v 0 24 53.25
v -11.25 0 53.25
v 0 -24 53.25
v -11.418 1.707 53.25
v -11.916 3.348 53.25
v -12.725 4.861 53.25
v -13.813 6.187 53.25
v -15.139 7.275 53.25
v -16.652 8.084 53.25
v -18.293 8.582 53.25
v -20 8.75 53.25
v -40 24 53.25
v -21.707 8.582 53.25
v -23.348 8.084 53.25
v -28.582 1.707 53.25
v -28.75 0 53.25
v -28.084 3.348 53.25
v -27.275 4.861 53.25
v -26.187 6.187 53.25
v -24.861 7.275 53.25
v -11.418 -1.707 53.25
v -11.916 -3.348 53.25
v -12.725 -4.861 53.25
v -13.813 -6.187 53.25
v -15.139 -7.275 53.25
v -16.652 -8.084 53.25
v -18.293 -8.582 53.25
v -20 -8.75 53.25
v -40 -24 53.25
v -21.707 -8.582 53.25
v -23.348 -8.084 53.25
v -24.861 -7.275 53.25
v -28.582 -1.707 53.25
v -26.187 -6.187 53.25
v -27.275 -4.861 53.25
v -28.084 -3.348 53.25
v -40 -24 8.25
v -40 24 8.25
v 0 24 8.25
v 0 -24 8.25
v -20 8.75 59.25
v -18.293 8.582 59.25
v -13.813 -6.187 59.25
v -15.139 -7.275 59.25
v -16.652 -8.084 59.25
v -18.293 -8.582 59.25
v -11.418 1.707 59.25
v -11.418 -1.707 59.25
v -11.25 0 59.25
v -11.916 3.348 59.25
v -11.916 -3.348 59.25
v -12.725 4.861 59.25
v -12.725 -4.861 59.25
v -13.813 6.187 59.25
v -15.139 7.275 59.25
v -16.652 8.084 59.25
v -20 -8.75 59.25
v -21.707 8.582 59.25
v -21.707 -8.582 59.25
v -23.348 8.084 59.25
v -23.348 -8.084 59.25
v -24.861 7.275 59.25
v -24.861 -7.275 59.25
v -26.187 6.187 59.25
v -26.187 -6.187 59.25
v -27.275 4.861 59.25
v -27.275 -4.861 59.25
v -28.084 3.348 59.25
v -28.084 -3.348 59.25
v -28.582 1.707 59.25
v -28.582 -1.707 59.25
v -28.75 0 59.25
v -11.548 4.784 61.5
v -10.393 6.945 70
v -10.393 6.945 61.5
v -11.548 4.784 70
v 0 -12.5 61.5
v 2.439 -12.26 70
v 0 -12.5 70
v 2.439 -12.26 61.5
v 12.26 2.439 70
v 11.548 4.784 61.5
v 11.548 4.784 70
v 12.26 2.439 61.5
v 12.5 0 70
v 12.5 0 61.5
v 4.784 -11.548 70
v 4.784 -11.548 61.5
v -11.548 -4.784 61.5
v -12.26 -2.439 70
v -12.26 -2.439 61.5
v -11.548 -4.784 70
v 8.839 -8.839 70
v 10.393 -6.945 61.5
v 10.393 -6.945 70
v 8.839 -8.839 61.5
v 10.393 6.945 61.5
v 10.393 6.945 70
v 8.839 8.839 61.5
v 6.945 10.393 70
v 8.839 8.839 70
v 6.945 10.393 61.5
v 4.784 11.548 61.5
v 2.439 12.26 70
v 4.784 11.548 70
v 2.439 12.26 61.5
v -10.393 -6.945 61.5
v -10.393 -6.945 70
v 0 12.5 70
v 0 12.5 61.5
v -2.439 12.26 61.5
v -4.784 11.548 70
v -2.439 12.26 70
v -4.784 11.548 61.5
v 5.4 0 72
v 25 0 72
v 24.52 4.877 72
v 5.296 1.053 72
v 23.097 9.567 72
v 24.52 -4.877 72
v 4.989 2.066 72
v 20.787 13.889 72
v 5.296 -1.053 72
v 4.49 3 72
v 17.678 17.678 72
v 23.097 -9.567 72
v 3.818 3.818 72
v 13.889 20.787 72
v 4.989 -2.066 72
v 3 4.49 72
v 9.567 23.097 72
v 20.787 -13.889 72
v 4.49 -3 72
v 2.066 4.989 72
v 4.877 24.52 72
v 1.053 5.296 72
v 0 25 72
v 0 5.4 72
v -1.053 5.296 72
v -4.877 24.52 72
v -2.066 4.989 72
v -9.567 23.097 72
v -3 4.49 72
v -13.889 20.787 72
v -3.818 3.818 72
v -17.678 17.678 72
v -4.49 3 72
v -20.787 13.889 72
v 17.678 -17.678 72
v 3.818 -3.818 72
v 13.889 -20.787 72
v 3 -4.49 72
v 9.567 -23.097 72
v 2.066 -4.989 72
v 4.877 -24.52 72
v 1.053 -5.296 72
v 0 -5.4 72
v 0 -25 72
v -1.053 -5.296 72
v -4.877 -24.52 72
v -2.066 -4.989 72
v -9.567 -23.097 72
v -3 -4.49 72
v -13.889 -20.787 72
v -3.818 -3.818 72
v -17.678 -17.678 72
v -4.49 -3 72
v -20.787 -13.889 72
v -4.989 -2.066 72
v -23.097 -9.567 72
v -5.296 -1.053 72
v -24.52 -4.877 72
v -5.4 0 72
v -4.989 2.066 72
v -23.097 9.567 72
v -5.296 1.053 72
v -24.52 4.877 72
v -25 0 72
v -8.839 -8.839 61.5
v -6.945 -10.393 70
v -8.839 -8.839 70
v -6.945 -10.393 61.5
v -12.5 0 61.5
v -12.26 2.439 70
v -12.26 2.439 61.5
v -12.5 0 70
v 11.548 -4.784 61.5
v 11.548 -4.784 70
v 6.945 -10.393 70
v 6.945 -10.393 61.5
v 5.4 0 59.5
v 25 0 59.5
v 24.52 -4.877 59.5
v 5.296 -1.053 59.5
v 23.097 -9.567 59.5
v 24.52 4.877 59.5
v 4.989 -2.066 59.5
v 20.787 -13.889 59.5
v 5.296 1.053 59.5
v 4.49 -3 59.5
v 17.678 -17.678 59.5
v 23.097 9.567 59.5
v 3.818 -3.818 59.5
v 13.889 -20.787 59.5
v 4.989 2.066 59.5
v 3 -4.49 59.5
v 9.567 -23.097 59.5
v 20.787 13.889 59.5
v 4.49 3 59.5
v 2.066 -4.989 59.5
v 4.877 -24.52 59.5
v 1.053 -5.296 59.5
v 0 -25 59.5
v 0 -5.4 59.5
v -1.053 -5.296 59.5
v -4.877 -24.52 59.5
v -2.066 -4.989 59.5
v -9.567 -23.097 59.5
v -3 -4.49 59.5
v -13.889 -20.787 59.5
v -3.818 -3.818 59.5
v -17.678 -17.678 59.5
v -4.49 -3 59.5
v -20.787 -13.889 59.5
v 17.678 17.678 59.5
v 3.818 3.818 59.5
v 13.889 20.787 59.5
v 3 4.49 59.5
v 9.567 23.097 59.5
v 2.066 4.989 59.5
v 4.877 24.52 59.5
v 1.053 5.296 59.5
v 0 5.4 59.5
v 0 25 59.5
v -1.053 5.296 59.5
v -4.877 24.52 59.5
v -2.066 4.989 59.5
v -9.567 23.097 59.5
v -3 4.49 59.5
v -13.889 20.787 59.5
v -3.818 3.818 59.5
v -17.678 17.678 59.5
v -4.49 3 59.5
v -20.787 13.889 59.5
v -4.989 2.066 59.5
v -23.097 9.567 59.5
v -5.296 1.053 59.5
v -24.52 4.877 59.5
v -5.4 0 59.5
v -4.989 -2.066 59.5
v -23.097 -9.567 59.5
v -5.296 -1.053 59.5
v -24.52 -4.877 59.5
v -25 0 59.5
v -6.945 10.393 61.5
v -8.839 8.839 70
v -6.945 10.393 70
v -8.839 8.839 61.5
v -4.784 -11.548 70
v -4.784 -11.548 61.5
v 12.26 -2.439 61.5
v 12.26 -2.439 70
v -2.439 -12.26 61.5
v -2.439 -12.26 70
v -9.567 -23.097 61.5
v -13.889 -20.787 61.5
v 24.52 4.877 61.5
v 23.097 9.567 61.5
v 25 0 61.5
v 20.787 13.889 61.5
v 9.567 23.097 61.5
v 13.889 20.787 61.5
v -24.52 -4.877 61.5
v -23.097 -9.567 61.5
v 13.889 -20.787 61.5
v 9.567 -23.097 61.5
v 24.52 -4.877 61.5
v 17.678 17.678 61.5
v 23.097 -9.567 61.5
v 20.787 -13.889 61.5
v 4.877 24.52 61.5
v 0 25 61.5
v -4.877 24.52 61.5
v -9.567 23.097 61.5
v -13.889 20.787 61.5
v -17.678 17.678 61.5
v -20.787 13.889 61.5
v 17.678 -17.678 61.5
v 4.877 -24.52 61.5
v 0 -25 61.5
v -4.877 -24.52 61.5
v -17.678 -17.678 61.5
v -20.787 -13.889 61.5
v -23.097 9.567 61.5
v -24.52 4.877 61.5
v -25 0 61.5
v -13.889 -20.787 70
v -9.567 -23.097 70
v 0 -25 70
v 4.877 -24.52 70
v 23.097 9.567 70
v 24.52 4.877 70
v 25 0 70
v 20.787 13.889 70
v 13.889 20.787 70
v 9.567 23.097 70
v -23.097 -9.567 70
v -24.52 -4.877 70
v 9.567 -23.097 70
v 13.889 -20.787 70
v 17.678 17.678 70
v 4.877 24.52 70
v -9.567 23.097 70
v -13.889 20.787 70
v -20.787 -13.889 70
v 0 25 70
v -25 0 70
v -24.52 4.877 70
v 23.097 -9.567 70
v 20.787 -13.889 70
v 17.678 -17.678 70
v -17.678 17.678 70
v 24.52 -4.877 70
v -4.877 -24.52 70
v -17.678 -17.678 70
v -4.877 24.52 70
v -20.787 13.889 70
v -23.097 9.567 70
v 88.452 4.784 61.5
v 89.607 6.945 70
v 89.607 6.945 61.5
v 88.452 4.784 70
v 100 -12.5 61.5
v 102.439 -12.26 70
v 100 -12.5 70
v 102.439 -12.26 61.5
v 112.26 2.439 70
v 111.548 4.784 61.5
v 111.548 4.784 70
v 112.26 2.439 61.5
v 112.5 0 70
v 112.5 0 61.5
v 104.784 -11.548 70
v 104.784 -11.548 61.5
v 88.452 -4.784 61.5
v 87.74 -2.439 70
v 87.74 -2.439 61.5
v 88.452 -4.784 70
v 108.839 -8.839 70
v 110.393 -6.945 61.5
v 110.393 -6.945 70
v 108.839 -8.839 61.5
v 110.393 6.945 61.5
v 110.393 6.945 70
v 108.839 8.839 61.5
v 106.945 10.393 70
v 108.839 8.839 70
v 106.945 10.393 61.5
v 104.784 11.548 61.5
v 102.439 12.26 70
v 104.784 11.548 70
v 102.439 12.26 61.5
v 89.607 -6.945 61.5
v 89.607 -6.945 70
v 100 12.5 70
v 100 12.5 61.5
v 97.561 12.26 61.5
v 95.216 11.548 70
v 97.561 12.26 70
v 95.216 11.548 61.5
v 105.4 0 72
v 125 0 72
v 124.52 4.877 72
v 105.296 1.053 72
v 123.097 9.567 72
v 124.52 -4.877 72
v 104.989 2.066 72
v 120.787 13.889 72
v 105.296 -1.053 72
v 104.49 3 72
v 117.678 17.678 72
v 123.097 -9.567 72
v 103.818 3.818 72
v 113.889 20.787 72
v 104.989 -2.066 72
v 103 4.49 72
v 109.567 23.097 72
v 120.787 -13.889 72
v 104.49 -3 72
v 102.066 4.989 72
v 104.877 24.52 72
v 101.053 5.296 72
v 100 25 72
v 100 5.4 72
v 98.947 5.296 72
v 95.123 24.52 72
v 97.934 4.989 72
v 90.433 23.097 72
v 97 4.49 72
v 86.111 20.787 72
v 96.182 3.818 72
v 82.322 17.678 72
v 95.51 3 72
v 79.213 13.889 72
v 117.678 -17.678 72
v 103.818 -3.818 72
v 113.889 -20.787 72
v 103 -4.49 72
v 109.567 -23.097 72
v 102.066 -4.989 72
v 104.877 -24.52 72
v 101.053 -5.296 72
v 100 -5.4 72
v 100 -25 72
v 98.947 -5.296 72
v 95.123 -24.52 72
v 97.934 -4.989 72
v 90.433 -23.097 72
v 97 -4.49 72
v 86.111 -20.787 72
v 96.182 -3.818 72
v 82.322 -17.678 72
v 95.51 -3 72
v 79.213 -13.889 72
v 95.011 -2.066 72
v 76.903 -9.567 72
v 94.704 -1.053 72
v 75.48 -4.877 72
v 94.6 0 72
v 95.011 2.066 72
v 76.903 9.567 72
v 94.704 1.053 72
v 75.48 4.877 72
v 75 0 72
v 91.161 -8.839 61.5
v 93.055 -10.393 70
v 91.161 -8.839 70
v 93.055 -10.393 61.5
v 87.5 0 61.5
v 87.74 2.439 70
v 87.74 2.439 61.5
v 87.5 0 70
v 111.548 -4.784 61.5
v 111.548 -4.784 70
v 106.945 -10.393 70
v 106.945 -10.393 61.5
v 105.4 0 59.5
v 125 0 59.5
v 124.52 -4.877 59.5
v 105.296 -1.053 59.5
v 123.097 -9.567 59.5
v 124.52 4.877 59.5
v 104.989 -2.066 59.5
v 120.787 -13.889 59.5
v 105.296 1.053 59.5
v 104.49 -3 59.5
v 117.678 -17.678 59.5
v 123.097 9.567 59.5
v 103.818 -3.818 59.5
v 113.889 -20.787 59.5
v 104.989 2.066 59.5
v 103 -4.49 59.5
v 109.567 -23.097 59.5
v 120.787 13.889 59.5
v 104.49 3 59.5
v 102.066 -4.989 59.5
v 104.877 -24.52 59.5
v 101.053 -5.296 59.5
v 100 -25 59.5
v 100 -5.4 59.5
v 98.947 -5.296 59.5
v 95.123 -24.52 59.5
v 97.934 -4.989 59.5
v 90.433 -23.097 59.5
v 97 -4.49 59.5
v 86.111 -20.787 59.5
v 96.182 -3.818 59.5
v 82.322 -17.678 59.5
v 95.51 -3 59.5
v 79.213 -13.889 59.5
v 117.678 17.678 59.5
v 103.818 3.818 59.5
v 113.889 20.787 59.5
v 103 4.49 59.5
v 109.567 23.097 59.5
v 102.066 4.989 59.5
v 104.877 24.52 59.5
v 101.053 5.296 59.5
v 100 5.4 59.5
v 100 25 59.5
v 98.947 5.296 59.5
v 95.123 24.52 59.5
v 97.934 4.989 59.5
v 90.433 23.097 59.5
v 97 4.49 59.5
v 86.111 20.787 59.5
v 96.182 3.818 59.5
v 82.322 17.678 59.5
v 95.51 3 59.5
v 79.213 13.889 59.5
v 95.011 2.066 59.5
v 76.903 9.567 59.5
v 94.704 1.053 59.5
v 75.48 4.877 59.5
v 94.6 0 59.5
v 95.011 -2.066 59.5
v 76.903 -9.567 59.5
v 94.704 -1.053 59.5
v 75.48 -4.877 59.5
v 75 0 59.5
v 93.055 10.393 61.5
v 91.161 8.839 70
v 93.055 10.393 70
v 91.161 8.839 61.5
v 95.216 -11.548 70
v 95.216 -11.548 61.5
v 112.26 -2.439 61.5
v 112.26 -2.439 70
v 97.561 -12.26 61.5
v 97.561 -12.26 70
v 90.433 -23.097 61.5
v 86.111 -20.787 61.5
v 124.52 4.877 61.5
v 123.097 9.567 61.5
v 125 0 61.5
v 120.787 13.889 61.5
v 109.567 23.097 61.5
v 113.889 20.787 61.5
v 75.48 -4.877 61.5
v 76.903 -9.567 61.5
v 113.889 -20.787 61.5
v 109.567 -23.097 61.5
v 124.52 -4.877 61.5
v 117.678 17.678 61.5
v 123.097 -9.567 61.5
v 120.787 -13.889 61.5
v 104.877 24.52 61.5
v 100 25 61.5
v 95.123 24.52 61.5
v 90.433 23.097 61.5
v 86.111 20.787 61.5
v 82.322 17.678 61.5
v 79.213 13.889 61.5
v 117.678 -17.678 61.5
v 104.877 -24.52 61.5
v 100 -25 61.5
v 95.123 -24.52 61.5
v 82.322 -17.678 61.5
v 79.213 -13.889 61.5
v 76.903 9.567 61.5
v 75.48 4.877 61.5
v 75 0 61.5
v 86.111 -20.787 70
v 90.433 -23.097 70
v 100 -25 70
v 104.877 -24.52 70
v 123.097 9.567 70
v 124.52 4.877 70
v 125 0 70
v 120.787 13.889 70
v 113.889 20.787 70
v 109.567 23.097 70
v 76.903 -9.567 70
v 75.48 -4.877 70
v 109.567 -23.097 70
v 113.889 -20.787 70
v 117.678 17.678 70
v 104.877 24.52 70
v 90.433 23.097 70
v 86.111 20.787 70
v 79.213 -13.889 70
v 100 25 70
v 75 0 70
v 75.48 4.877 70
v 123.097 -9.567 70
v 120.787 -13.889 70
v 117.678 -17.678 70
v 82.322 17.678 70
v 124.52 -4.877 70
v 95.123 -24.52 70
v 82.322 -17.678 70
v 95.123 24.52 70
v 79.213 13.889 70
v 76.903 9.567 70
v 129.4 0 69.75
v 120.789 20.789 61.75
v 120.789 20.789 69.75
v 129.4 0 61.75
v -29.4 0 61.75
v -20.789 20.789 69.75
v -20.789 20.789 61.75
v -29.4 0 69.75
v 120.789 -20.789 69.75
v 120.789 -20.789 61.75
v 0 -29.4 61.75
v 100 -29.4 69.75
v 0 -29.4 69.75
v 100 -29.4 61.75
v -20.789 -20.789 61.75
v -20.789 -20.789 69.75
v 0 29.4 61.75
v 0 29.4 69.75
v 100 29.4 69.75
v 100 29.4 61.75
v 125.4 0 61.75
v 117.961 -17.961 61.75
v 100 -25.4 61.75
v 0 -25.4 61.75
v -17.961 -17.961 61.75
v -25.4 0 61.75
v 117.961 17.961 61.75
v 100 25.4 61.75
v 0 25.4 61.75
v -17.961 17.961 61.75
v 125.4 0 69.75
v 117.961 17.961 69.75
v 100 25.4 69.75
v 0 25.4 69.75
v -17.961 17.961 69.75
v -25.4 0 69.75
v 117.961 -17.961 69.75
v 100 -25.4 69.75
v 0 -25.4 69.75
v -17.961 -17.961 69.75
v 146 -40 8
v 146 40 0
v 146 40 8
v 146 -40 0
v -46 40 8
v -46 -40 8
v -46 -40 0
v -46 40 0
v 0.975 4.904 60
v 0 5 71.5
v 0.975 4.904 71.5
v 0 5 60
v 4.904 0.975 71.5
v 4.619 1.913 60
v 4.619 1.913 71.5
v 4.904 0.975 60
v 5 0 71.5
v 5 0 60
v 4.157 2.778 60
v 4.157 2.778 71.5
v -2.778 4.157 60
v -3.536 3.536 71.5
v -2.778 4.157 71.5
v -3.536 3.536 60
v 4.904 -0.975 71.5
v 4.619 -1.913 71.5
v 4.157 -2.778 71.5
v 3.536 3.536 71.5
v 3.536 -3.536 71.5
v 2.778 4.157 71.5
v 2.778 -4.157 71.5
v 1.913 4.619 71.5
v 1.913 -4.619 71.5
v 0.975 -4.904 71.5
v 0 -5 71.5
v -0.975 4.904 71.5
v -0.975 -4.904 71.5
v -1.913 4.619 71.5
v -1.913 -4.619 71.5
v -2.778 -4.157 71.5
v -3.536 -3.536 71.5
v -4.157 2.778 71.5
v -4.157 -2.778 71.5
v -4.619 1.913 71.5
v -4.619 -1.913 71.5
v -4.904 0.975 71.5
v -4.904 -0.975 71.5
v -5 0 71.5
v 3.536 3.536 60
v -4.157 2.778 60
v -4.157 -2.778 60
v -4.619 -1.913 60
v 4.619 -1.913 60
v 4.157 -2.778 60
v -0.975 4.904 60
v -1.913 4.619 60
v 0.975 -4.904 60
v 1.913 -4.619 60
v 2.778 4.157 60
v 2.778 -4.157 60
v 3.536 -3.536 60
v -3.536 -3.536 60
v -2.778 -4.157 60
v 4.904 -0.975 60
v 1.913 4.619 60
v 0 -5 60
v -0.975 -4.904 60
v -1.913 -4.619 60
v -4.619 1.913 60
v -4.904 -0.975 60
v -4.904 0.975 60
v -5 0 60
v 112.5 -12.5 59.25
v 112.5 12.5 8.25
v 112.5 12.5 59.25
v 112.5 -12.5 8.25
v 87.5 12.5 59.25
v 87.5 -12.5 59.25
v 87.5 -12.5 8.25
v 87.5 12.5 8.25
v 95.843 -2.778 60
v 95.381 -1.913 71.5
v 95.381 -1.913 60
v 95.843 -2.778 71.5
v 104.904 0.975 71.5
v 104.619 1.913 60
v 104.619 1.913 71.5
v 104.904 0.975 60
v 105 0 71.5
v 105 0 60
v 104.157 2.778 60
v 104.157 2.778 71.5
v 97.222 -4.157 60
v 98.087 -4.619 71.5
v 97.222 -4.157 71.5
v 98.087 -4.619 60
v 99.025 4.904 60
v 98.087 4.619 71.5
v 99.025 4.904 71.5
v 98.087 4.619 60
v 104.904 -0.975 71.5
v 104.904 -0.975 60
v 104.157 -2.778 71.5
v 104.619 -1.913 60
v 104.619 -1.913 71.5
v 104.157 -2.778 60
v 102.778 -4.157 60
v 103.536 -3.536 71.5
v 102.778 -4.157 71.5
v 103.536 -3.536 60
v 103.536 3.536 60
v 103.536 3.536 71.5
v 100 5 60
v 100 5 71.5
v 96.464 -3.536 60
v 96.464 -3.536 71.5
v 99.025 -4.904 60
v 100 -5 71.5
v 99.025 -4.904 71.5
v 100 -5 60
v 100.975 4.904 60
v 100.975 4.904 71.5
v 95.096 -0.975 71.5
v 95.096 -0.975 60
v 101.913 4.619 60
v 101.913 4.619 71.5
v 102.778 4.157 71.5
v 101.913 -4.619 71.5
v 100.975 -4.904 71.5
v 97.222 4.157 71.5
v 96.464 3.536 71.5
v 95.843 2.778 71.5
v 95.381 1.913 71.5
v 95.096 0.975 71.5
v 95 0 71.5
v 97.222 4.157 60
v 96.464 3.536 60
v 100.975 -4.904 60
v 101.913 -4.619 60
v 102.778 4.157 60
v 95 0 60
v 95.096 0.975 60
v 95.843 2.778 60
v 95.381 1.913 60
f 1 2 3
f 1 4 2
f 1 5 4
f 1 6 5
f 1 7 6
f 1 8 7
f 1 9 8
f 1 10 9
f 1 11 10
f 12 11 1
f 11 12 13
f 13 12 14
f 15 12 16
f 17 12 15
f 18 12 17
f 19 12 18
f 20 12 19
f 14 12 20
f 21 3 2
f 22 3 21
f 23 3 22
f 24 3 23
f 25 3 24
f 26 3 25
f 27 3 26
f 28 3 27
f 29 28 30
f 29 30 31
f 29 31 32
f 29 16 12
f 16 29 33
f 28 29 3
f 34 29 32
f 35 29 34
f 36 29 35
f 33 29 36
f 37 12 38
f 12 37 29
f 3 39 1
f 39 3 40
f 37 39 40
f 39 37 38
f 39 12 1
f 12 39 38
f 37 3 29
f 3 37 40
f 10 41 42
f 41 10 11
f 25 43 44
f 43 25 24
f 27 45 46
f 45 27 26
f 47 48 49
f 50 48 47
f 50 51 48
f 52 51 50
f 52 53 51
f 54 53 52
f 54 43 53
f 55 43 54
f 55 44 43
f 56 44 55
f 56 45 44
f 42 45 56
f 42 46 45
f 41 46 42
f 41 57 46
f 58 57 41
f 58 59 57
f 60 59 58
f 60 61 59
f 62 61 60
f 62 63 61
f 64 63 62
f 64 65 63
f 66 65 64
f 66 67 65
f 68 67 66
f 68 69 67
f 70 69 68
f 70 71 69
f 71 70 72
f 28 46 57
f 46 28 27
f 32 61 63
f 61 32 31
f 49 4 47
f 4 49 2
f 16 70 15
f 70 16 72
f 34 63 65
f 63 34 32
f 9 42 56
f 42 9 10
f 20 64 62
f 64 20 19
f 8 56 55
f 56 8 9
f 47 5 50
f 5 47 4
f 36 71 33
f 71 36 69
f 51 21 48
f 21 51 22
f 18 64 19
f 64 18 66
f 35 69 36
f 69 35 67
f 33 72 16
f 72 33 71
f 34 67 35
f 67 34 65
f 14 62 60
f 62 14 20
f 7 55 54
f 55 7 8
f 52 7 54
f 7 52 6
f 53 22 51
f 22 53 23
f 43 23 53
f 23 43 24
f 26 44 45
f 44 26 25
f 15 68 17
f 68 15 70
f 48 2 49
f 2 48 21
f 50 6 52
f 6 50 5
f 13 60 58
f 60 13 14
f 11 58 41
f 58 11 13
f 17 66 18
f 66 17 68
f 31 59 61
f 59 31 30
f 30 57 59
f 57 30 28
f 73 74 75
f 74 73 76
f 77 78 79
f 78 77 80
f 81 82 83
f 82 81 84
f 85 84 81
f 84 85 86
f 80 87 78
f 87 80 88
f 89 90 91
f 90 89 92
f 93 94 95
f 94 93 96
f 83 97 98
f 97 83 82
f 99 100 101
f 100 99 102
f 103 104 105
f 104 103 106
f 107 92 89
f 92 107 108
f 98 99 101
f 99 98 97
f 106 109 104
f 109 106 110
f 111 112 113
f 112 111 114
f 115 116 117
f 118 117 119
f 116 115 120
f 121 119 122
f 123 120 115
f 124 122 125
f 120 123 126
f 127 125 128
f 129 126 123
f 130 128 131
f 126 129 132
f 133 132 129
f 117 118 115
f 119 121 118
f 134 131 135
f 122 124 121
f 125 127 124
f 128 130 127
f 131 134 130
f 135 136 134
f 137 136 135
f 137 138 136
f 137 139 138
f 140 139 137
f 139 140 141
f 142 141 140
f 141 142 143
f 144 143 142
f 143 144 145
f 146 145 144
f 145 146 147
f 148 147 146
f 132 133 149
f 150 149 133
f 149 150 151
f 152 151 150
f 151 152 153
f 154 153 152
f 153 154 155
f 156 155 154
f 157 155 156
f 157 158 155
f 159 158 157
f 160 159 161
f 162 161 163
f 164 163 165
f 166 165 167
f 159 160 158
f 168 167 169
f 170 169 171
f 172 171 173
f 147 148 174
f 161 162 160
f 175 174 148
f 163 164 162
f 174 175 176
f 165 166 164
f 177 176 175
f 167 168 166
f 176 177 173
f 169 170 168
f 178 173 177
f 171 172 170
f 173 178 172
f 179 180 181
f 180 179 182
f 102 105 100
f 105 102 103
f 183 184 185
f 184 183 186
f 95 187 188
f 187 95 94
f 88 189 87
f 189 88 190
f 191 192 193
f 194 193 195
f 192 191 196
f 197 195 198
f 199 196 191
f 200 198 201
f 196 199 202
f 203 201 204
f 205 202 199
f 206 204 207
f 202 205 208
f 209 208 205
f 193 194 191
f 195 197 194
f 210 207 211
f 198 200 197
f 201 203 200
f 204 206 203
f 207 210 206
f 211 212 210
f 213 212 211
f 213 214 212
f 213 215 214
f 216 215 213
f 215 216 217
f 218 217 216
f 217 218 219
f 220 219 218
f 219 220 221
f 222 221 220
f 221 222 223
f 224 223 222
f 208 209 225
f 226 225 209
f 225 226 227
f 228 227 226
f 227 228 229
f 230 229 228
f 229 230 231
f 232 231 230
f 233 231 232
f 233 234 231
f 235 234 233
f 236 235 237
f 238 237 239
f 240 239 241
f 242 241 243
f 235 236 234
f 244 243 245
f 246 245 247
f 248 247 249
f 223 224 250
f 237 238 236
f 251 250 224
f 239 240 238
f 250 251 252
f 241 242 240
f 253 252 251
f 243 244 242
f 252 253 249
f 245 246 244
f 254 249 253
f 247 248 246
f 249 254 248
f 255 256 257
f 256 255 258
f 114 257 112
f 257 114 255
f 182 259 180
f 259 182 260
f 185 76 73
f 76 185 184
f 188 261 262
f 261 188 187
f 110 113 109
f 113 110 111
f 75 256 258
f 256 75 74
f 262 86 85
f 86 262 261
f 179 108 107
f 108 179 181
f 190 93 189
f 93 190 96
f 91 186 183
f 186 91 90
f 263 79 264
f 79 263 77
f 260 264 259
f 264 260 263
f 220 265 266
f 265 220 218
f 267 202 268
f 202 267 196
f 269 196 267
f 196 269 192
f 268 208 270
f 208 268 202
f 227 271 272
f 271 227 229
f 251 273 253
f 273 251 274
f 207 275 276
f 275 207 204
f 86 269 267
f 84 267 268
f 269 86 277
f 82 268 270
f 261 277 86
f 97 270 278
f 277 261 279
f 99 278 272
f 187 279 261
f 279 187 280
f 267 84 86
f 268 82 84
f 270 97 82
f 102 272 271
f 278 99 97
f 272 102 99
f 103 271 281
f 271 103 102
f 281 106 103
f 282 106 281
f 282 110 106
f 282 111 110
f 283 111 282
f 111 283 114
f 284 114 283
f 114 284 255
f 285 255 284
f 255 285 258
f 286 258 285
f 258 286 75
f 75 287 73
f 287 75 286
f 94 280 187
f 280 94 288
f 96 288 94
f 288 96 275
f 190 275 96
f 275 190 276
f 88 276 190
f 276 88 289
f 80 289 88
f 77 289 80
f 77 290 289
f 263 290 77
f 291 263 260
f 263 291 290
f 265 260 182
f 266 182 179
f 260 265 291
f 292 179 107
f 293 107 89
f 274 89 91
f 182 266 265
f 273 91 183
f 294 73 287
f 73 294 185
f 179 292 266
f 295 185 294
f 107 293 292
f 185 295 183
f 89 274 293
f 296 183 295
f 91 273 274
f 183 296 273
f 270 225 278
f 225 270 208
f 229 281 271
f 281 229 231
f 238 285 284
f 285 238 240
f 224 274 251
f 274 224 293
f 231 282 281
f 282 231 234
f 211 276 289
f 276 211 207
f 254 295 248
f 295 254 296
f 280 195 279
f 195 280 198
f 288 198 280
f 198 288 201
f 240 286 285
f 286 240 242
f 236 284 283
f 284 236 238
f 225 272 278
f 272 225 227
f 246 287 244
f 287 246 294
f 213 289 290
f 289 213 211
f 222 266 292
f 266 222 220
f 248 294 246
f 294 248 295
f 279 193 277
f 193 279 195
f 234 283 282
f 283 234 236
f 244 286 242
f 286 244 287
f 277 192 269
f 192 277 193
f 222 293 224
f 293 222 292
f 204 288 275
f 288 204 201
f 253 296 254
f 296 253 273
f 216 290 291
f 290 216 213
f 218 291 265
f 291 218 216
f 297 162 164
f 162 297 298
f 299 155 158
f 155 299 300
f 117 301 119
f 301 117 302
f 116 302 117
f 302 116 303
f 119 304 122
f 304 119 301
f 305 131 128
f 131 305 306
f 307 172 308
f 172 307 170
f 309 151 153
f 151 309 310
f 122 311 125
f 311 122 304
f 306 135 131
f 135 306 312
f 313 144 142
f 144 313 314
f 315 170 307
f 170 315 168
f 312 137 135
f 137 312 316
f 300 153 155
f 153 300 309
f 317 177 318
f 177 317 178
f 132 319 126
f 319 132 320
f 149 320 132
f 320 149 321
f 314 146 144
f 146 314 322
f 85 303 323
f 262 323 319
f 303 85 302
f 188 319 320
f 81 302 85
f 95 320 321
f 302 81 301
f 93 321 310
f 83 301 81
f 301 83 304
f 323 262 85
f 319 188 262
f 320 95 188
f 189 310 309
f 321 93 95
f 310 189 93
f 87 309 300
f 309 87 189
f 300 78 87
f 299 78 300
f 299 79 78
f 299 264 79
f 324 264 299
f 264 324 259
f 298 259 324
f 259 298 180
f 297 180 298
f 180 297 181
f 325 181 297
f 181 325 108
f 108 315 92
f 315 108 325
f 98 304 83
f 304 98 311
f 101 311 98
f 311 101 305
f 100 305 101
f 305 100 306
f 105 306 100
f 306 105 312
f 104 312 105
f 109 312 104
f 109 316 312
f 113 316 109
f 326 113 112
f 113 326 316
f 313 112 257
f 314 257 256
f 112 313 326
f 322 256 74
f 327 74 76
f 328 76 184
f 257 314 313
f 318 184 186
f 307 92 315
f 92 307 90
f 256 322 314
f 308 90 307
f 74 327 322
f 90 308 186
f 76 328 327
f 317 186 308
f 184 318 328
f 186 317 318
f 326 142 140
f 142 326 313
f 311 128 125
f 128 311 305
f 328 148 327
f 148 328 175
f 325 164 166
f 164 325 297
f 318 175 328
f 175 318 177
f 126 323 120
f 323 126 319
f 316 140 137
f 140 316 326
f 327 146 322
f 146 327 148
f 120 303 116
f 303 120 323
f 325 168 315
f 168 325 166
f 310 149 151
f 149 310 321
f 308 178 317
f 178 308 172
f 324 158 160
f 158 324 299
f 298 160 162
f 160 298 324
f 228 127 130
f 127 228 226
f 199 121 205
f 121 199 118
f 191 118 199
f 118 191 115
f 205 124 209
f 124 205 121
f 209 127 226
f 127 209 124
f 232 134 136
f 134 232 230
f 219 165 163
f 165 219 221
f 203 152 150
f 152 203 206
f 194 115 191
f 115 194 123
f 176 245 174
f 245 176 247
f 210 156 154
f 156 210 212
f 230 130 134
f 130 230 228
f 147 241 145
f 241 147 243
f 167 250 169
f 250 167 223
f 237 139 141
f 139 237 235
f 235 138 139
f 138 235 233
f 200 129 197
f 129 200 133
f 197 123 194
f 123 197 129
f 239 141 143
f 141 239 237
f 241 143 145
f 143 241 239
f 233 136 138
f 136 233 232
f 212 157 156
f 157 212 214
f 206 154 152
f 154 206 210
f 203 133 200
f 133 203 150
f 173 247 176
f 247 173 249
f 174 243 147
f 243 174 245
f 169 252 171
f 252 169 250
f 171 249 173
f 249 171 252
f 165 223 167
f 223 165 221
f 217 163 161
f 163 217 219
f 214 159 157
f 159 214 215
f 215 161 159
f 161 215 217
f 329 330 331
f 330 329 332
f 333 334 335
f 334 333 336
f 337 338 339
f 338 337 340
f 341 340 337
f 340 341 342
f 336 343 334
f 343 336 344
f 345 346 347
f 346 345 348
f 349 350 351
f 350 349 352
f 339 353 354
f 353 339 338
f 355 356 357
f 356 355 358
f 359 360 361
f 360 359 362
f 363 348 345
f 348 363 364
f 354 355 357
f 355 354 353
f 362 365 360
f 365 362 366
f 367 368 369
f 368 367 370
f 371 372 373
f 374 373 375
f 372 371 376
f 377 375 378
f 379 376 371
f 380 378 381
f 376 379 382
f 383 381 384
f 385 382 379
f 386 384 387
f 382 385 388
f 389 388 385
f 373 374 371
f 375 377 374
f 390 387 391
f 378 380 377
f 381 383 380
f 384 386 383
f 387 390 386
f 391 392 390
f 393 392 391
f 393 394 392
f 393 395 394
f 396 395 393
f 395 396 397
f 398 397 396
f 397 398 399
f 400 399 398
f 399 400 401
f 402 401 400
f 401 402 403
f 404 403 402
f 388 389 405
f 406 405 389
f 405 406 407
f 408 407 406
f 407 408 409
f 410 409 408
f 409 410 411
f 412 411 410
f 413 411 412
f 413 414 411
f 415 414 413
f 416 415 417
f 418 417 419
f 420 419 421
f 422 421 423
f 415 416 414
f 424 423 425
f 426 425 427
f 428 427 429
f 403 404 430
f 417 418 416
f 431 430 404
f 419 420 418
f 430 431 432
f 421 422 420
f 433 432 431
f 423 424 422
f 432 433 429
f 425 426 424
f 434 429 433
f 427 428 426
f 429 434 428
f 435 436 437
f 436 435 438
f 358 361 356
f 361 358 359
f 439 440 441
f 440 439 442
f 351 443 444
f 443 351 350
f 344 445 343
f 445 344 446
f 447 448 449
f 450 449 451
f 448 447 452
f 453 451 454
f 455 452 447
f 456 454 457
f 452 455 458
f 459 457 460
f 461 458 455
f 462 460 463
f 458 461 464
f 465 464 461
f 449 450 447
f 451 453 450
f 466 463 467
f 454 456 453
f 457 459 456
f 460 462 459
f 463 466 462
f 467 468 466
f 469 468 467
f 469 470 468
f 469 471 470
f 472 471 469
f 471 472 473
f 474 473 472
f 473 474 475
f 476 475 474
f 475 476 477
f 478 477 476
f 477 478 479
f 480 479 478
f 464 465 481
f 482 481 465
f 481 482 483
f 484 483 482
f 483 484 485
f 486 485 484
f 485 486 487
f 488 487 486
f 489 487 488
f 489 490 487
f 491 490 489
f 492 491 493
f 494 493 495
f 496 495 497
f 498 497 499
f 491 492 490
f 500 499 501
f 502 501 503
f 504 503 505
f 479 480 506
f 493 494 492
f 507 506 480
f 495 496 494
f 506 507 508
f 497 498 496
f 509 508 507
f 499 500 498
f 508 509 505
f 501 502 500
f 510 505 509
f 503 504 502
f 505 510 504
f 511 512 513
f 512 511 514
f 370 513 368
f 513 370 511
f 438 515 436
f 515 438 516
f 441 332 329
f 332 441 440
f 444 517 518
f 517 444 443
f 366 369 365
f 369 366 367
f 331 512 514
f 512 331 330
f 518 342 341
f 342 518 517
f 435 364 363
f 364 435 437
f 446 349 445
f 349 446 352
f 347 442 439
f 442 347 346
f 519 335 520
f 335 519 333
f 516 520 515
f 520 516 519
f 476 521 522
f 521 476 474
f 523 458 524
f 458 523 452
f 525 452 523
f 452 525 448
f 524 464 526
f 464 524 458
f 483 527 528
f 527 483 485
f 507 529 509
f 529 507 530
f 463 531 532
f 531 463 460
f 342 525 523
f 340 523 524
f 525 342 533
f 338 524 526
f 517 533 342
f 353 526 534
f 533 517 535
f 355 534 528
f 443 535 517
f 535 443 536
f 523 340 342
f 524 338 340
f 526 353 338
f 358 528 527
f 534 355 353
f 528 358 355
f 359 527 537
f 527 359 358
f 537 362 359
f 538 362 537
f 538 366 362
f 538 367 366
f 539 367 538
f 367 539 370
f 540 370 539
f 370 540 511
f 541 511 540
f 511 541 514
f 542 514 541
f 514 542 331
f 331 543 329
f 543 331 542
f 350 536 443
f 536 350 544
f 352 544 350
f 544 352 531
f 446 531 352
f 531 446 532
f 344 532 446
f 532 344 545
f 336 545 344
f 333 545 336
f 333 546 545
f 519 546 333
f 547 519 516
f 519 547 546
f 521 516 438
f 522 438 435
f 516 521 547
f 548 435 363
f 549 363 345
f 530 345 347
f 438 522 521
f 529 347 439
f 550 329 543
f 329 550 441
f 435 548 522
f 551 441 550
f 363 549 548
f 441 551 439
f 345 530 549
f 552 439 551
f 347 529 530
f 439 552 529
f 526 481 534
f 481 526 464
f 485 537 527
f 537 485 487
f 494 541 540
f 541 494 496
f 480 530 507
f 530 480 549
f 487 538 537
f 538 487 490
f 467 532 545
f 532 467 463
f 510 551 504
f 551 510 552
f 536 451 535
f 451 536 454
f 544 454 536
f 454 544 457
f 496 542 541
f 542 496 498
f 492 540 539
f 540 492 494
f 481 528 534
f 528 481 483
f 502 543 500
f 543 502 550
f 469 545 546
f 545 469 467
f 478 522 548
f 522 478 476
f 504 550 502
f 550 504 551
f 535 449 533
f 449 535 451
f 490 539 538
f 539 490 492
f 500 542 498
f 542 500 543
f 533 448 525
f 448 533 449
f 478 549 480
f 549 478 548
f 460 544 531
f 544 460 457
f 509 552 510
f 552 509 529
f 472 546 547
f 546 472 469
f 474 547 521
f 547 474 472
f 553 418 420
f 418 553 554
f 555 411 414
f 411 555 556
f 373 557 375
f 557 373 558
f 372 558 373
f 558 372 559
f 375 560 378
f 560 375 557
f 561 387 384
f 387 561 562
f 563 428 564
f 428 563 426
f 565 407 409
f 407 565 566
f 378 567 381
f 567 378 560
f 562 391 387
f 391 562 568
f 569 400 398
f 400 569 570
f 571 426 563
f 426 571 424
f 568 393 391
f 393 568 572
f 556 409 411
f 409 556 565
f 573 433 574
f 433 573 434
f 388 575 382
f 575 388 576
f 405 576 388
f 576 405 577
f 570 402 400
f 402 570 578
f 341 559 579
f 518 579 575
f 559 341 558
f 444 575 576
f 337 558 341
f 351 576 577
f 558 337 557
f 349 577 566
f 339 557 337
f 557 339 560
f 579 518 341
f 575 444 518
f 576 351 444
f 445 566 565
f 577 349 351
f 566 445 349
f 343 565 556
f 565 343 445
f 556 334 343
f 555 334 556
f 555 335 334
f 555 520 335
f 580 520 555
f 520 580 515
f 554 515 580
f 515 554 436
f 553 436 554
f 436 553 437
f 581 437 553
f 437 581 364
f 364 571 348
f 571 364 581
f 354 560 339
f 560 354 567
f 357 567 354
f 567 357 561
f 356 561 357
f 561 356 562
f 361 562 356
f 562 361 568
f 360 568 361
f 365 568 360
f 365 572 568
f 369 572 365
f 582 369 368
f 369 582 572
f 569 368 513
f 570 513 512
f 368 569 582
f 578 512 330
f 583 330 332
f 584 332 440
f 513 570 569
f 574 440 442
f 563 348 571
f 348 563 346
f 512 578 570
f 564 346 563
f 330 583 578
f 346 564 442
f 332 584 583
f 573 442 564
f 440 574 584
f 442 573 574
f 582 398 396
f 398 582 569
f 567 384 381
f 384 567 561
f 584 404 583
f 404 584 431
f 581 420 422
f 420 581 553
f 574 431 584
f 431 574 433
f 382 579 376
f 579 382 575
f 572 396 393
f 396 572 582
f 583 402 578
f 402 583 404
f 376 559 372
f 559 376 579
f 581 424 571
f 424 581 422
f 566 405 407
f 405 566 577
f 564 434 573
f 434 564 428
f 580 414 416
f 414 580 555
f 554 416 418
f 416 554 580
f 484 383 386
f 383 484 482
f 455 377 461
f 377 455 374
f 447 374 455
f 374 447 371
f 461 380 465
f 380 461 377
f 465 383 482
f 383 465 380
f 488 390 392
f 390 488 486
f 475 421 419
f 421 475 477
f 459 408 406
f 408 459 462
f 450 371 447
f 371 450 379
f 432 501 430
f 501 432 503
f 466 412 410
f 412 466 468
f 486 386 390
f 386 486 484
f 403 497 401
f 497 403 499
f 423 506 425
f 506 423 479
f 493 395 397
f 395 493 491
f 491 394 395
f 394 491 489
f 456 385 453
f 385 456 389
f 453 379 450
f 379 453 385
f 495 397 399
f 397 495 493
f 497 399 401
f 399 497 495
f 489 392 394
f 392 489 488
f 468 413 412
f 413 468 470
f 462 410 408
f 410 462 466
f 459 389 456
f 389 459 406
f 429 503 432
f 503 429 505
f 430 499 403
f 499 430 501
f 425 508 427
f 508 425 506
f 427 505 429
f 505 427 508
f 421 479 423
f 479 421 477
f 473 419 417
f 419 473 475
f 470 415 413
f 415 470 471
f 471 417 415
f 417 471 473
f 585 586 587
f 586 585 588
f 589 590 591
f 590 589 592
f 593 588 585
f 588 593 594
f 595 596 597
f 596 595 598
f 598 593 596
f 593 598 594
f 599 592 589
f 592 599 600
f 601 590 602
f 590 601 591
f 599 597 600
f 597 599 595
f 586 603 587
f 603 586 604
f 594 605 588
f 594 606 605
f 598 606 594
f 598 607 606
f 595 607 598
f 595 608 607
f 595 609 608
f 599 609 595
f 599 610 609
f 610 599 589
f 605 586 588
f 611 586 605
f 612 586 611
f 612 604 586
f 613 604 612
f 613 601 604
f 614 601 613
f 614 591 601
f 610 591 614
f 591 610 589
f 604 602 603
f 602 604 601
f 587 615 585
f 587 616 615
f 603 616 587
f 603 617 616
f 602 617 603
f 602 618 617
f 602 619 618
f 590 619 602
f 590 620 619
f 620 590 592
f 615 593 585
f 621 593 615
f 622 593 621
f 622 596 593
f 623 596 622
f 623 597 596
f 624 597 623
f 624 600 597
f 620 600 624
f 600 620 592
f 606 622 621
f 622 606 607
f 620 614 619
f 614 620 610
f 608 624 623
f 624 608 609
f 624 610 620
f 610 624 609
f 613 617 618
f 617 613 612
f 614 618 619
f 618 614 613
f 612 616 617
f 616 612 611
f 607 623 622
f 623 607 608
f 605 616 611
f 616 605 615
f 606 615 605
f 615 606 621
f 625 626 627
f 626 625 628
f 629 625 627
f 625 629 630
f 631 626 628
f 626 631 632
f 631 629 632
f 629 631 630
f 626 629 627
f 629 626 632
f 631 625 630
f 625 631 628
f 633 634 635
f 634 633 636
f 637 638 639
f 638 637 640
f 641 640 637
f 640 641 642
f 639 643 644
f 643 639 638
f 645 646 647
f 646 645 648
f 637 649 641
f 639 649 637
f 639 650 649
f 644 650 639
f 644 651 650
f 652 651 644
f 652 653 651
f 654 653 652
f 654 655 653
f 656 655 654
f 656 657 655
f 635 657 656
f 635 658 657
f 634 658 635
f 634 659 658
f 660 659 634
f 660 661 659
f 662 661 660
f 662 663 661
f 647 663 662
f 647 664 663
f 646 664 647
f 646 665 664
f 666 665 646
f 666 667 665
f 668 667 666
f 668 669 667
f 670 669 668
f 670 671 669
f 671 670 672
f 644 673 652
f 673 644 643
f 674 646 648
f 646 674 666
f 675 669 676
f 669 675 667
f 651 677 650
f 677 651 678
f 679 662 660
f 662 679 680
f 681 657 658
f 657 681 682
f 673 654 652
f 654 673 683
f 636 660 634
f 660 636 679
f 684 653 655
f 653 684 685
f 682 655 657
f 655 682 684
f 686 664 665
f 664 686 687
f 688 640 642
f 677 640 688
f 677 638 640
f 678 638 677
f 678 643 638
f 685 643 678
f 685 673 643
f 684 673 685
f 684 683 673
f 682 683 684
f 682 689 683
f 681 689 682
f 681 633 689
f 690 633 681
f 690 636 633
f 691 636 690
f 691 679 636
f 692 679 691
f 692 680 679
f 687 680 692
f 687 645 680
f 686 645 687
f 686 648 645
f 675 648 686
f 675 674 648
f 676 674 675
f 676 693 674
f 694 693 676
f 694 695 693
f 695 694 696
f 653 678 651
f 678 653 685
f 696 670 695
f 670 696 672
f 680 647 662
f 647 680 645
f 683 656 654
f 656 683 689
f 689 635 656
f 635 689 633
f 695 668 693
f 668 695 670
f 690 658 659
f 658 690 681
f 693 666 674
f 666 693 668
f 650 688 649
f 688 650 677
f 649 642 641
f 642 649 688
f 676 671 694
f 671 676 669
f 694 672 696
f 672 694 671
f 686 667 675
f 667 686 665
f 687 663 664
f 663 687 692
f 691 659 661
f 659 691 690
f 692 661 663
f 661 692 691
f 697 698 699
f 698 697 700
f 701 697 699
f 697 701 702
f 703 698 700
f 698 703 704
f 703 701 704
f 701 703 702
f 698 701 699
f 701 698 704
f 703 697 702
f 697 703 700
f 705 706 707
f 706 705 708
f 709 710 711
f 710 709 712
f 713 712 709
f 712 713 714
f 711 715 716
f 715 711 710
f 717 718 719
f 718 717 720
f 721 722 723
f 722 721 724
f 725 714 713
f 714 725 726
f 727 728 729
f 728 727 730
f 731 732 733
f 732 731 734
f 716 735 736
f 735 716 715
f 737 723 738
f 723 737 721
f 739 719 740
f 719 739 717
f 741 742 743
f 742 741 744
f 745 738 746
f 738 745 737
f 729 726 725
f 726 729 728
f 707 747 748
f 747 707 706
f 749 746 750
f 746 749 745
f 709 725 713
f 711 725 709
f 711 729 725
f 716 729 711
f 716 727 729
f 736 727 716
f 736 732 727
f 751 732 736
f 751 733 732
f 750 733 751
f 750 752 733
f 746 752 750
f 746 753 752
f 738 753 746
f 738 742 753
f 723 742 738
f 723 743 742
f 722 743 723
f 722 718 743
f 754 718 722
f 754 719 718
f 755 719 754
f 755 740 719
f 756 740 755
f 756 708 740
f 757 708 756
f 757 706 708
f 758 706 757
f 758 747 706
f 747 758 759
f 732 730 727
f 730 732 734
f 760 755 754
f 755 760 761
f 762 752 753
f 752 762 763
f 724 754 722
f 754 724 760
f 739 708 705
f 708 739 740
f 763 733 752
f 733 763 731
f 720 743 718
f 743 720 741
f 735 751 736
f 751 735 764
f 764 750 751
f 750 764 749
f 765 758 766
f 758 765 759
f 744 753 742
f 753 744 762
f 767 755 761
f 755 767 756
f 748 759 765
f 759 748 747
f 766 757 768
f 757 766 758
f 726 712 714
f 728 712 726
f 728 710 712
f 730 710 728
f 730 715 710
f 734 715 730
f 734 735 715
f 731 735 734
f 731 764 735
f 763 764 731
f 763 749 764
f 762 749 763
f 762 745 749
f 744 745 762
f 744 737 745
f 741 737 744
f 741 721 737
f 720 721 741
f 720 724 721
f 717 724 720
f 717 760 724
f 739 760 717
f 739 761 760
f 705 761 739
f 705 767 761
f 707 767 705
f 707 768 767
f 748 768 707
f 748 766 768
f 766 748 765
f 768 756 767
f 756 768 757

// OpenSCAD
$fn = 32;

// ------------------------------------------------------------------------
// Motor belt drive: span 100 mm, pulleys d50, belt 8 mm wide
// Every part is its own module, assembly() places every instance.
// ------------------------------------------------------------------------

// --- part 1 ---
module base_plate() {
  difference() {
    translate([-96, -40, 0]) cube([192, 80, 8]);
  }
}

// --- part 2 ---
module motor() {
  union() {
    translate([-22.5, -24, 0]) cube([45, 48, 40]);
    translate([25.5, 0, 20]) rotate([0, 90, 0]) cylinder(h = 6, d = 17.5, center = true);
  }
}

// --- part 3 ---
module drive_shaft() {
  translate([0, 0, -5.75]) cylinder(h = 11.5, d = 10);
}

// --- part 4 ---
module pulley_drive() {
  difference() {
    union() {
      cylinder(h = 12.5, d = 25);
      cylinder(h = 2, d = 50);
      translate([0, 0, 10.5]) cylinder(h = 2, d = 50);
    }
    translate([0, 0, -1]) cylinder(h = 14.5, d = 10.8);
  }
}

// --- part 5 ---
module idler_post() {
  translate([-12.5, -12.5, 0]) cube([25, 25, 51]);
}

// --- part 6 ---
module driven_shaft() {
  translate([0, 0, -5.75]) cylinder(h = 11.5, d = 10);
}

// --- part 7 ---
module pulley_driven() {
  difference() {
    union() {
      cylinder(h = 12.5, d = 25);
      cylinder(h = 2, d = 50);
      translate([0, 0, 10.5]) cylinder(h = 2, d = 50);
    }
    translate([0, 0, -1]) cylinder(h = 14.5, d = 10.8);
  }
}

// --- part 8 ---
module drive_belt() {
  difference() {
    linear_extrude(height = 8) polygon(points = concat([for (a = [90 : 45 : 270]) [29.4 * cos(a), 29.4 * sin(a)]], [for (a = [270 : 45 : 450]) [100 + 29.4 * cos(a), 29.4 * sin(a)]]));
    translate([0, 0, -1]) linear_extrude(height = 10) polygon(points = concat([for (a = [90 : 45 : 270]) [25.4 * cos(a), 25.4 * sin(a)]], [for (a = [270 : 45 : 450]) [100 + 25.4 * cos(a), 25.4 * sin(a)]]));
  }
}

// --- assembly ---
module assembly() {
  color([0.80, 0.24, 0.20]) translate([50, 0, 0]) rotate([0, 0, 0]) base_plate();
  color([0.20, 0.45, 0.75]) translate([0, 0, 30.75]) rotate([0, 270, 0]) motor();
  color([0.25, 0.62, 0.32]) translate([0, 0, 65.75]) rotate([0, 0, 0]) drive_shaft();
  color([0.92, 0.70, 0.18]) translate([0, 0, 59.5]) rotate([0, 0, 0]) pulley_drive();
  color([0.58, 0.35, 0.70]) translate([100, 0, 8.25]) rotate([0, 0, 0]) idler_post();
  color([0.16, 0.66, 0.66]) translate([100, 0, 65.75]) rotate([0, 0, 0]) driven_shaft();
  color([0.85, 0.48, 0.18]) translate([100, 0, 59.5]) rotate([0, 0, 0]) pulley_driven();
  color([0.55, 0.60, 0.65]) translate([0, 0, 61.75]) rotate([0, 0, 0]) drive_belt();
}

assembly();
